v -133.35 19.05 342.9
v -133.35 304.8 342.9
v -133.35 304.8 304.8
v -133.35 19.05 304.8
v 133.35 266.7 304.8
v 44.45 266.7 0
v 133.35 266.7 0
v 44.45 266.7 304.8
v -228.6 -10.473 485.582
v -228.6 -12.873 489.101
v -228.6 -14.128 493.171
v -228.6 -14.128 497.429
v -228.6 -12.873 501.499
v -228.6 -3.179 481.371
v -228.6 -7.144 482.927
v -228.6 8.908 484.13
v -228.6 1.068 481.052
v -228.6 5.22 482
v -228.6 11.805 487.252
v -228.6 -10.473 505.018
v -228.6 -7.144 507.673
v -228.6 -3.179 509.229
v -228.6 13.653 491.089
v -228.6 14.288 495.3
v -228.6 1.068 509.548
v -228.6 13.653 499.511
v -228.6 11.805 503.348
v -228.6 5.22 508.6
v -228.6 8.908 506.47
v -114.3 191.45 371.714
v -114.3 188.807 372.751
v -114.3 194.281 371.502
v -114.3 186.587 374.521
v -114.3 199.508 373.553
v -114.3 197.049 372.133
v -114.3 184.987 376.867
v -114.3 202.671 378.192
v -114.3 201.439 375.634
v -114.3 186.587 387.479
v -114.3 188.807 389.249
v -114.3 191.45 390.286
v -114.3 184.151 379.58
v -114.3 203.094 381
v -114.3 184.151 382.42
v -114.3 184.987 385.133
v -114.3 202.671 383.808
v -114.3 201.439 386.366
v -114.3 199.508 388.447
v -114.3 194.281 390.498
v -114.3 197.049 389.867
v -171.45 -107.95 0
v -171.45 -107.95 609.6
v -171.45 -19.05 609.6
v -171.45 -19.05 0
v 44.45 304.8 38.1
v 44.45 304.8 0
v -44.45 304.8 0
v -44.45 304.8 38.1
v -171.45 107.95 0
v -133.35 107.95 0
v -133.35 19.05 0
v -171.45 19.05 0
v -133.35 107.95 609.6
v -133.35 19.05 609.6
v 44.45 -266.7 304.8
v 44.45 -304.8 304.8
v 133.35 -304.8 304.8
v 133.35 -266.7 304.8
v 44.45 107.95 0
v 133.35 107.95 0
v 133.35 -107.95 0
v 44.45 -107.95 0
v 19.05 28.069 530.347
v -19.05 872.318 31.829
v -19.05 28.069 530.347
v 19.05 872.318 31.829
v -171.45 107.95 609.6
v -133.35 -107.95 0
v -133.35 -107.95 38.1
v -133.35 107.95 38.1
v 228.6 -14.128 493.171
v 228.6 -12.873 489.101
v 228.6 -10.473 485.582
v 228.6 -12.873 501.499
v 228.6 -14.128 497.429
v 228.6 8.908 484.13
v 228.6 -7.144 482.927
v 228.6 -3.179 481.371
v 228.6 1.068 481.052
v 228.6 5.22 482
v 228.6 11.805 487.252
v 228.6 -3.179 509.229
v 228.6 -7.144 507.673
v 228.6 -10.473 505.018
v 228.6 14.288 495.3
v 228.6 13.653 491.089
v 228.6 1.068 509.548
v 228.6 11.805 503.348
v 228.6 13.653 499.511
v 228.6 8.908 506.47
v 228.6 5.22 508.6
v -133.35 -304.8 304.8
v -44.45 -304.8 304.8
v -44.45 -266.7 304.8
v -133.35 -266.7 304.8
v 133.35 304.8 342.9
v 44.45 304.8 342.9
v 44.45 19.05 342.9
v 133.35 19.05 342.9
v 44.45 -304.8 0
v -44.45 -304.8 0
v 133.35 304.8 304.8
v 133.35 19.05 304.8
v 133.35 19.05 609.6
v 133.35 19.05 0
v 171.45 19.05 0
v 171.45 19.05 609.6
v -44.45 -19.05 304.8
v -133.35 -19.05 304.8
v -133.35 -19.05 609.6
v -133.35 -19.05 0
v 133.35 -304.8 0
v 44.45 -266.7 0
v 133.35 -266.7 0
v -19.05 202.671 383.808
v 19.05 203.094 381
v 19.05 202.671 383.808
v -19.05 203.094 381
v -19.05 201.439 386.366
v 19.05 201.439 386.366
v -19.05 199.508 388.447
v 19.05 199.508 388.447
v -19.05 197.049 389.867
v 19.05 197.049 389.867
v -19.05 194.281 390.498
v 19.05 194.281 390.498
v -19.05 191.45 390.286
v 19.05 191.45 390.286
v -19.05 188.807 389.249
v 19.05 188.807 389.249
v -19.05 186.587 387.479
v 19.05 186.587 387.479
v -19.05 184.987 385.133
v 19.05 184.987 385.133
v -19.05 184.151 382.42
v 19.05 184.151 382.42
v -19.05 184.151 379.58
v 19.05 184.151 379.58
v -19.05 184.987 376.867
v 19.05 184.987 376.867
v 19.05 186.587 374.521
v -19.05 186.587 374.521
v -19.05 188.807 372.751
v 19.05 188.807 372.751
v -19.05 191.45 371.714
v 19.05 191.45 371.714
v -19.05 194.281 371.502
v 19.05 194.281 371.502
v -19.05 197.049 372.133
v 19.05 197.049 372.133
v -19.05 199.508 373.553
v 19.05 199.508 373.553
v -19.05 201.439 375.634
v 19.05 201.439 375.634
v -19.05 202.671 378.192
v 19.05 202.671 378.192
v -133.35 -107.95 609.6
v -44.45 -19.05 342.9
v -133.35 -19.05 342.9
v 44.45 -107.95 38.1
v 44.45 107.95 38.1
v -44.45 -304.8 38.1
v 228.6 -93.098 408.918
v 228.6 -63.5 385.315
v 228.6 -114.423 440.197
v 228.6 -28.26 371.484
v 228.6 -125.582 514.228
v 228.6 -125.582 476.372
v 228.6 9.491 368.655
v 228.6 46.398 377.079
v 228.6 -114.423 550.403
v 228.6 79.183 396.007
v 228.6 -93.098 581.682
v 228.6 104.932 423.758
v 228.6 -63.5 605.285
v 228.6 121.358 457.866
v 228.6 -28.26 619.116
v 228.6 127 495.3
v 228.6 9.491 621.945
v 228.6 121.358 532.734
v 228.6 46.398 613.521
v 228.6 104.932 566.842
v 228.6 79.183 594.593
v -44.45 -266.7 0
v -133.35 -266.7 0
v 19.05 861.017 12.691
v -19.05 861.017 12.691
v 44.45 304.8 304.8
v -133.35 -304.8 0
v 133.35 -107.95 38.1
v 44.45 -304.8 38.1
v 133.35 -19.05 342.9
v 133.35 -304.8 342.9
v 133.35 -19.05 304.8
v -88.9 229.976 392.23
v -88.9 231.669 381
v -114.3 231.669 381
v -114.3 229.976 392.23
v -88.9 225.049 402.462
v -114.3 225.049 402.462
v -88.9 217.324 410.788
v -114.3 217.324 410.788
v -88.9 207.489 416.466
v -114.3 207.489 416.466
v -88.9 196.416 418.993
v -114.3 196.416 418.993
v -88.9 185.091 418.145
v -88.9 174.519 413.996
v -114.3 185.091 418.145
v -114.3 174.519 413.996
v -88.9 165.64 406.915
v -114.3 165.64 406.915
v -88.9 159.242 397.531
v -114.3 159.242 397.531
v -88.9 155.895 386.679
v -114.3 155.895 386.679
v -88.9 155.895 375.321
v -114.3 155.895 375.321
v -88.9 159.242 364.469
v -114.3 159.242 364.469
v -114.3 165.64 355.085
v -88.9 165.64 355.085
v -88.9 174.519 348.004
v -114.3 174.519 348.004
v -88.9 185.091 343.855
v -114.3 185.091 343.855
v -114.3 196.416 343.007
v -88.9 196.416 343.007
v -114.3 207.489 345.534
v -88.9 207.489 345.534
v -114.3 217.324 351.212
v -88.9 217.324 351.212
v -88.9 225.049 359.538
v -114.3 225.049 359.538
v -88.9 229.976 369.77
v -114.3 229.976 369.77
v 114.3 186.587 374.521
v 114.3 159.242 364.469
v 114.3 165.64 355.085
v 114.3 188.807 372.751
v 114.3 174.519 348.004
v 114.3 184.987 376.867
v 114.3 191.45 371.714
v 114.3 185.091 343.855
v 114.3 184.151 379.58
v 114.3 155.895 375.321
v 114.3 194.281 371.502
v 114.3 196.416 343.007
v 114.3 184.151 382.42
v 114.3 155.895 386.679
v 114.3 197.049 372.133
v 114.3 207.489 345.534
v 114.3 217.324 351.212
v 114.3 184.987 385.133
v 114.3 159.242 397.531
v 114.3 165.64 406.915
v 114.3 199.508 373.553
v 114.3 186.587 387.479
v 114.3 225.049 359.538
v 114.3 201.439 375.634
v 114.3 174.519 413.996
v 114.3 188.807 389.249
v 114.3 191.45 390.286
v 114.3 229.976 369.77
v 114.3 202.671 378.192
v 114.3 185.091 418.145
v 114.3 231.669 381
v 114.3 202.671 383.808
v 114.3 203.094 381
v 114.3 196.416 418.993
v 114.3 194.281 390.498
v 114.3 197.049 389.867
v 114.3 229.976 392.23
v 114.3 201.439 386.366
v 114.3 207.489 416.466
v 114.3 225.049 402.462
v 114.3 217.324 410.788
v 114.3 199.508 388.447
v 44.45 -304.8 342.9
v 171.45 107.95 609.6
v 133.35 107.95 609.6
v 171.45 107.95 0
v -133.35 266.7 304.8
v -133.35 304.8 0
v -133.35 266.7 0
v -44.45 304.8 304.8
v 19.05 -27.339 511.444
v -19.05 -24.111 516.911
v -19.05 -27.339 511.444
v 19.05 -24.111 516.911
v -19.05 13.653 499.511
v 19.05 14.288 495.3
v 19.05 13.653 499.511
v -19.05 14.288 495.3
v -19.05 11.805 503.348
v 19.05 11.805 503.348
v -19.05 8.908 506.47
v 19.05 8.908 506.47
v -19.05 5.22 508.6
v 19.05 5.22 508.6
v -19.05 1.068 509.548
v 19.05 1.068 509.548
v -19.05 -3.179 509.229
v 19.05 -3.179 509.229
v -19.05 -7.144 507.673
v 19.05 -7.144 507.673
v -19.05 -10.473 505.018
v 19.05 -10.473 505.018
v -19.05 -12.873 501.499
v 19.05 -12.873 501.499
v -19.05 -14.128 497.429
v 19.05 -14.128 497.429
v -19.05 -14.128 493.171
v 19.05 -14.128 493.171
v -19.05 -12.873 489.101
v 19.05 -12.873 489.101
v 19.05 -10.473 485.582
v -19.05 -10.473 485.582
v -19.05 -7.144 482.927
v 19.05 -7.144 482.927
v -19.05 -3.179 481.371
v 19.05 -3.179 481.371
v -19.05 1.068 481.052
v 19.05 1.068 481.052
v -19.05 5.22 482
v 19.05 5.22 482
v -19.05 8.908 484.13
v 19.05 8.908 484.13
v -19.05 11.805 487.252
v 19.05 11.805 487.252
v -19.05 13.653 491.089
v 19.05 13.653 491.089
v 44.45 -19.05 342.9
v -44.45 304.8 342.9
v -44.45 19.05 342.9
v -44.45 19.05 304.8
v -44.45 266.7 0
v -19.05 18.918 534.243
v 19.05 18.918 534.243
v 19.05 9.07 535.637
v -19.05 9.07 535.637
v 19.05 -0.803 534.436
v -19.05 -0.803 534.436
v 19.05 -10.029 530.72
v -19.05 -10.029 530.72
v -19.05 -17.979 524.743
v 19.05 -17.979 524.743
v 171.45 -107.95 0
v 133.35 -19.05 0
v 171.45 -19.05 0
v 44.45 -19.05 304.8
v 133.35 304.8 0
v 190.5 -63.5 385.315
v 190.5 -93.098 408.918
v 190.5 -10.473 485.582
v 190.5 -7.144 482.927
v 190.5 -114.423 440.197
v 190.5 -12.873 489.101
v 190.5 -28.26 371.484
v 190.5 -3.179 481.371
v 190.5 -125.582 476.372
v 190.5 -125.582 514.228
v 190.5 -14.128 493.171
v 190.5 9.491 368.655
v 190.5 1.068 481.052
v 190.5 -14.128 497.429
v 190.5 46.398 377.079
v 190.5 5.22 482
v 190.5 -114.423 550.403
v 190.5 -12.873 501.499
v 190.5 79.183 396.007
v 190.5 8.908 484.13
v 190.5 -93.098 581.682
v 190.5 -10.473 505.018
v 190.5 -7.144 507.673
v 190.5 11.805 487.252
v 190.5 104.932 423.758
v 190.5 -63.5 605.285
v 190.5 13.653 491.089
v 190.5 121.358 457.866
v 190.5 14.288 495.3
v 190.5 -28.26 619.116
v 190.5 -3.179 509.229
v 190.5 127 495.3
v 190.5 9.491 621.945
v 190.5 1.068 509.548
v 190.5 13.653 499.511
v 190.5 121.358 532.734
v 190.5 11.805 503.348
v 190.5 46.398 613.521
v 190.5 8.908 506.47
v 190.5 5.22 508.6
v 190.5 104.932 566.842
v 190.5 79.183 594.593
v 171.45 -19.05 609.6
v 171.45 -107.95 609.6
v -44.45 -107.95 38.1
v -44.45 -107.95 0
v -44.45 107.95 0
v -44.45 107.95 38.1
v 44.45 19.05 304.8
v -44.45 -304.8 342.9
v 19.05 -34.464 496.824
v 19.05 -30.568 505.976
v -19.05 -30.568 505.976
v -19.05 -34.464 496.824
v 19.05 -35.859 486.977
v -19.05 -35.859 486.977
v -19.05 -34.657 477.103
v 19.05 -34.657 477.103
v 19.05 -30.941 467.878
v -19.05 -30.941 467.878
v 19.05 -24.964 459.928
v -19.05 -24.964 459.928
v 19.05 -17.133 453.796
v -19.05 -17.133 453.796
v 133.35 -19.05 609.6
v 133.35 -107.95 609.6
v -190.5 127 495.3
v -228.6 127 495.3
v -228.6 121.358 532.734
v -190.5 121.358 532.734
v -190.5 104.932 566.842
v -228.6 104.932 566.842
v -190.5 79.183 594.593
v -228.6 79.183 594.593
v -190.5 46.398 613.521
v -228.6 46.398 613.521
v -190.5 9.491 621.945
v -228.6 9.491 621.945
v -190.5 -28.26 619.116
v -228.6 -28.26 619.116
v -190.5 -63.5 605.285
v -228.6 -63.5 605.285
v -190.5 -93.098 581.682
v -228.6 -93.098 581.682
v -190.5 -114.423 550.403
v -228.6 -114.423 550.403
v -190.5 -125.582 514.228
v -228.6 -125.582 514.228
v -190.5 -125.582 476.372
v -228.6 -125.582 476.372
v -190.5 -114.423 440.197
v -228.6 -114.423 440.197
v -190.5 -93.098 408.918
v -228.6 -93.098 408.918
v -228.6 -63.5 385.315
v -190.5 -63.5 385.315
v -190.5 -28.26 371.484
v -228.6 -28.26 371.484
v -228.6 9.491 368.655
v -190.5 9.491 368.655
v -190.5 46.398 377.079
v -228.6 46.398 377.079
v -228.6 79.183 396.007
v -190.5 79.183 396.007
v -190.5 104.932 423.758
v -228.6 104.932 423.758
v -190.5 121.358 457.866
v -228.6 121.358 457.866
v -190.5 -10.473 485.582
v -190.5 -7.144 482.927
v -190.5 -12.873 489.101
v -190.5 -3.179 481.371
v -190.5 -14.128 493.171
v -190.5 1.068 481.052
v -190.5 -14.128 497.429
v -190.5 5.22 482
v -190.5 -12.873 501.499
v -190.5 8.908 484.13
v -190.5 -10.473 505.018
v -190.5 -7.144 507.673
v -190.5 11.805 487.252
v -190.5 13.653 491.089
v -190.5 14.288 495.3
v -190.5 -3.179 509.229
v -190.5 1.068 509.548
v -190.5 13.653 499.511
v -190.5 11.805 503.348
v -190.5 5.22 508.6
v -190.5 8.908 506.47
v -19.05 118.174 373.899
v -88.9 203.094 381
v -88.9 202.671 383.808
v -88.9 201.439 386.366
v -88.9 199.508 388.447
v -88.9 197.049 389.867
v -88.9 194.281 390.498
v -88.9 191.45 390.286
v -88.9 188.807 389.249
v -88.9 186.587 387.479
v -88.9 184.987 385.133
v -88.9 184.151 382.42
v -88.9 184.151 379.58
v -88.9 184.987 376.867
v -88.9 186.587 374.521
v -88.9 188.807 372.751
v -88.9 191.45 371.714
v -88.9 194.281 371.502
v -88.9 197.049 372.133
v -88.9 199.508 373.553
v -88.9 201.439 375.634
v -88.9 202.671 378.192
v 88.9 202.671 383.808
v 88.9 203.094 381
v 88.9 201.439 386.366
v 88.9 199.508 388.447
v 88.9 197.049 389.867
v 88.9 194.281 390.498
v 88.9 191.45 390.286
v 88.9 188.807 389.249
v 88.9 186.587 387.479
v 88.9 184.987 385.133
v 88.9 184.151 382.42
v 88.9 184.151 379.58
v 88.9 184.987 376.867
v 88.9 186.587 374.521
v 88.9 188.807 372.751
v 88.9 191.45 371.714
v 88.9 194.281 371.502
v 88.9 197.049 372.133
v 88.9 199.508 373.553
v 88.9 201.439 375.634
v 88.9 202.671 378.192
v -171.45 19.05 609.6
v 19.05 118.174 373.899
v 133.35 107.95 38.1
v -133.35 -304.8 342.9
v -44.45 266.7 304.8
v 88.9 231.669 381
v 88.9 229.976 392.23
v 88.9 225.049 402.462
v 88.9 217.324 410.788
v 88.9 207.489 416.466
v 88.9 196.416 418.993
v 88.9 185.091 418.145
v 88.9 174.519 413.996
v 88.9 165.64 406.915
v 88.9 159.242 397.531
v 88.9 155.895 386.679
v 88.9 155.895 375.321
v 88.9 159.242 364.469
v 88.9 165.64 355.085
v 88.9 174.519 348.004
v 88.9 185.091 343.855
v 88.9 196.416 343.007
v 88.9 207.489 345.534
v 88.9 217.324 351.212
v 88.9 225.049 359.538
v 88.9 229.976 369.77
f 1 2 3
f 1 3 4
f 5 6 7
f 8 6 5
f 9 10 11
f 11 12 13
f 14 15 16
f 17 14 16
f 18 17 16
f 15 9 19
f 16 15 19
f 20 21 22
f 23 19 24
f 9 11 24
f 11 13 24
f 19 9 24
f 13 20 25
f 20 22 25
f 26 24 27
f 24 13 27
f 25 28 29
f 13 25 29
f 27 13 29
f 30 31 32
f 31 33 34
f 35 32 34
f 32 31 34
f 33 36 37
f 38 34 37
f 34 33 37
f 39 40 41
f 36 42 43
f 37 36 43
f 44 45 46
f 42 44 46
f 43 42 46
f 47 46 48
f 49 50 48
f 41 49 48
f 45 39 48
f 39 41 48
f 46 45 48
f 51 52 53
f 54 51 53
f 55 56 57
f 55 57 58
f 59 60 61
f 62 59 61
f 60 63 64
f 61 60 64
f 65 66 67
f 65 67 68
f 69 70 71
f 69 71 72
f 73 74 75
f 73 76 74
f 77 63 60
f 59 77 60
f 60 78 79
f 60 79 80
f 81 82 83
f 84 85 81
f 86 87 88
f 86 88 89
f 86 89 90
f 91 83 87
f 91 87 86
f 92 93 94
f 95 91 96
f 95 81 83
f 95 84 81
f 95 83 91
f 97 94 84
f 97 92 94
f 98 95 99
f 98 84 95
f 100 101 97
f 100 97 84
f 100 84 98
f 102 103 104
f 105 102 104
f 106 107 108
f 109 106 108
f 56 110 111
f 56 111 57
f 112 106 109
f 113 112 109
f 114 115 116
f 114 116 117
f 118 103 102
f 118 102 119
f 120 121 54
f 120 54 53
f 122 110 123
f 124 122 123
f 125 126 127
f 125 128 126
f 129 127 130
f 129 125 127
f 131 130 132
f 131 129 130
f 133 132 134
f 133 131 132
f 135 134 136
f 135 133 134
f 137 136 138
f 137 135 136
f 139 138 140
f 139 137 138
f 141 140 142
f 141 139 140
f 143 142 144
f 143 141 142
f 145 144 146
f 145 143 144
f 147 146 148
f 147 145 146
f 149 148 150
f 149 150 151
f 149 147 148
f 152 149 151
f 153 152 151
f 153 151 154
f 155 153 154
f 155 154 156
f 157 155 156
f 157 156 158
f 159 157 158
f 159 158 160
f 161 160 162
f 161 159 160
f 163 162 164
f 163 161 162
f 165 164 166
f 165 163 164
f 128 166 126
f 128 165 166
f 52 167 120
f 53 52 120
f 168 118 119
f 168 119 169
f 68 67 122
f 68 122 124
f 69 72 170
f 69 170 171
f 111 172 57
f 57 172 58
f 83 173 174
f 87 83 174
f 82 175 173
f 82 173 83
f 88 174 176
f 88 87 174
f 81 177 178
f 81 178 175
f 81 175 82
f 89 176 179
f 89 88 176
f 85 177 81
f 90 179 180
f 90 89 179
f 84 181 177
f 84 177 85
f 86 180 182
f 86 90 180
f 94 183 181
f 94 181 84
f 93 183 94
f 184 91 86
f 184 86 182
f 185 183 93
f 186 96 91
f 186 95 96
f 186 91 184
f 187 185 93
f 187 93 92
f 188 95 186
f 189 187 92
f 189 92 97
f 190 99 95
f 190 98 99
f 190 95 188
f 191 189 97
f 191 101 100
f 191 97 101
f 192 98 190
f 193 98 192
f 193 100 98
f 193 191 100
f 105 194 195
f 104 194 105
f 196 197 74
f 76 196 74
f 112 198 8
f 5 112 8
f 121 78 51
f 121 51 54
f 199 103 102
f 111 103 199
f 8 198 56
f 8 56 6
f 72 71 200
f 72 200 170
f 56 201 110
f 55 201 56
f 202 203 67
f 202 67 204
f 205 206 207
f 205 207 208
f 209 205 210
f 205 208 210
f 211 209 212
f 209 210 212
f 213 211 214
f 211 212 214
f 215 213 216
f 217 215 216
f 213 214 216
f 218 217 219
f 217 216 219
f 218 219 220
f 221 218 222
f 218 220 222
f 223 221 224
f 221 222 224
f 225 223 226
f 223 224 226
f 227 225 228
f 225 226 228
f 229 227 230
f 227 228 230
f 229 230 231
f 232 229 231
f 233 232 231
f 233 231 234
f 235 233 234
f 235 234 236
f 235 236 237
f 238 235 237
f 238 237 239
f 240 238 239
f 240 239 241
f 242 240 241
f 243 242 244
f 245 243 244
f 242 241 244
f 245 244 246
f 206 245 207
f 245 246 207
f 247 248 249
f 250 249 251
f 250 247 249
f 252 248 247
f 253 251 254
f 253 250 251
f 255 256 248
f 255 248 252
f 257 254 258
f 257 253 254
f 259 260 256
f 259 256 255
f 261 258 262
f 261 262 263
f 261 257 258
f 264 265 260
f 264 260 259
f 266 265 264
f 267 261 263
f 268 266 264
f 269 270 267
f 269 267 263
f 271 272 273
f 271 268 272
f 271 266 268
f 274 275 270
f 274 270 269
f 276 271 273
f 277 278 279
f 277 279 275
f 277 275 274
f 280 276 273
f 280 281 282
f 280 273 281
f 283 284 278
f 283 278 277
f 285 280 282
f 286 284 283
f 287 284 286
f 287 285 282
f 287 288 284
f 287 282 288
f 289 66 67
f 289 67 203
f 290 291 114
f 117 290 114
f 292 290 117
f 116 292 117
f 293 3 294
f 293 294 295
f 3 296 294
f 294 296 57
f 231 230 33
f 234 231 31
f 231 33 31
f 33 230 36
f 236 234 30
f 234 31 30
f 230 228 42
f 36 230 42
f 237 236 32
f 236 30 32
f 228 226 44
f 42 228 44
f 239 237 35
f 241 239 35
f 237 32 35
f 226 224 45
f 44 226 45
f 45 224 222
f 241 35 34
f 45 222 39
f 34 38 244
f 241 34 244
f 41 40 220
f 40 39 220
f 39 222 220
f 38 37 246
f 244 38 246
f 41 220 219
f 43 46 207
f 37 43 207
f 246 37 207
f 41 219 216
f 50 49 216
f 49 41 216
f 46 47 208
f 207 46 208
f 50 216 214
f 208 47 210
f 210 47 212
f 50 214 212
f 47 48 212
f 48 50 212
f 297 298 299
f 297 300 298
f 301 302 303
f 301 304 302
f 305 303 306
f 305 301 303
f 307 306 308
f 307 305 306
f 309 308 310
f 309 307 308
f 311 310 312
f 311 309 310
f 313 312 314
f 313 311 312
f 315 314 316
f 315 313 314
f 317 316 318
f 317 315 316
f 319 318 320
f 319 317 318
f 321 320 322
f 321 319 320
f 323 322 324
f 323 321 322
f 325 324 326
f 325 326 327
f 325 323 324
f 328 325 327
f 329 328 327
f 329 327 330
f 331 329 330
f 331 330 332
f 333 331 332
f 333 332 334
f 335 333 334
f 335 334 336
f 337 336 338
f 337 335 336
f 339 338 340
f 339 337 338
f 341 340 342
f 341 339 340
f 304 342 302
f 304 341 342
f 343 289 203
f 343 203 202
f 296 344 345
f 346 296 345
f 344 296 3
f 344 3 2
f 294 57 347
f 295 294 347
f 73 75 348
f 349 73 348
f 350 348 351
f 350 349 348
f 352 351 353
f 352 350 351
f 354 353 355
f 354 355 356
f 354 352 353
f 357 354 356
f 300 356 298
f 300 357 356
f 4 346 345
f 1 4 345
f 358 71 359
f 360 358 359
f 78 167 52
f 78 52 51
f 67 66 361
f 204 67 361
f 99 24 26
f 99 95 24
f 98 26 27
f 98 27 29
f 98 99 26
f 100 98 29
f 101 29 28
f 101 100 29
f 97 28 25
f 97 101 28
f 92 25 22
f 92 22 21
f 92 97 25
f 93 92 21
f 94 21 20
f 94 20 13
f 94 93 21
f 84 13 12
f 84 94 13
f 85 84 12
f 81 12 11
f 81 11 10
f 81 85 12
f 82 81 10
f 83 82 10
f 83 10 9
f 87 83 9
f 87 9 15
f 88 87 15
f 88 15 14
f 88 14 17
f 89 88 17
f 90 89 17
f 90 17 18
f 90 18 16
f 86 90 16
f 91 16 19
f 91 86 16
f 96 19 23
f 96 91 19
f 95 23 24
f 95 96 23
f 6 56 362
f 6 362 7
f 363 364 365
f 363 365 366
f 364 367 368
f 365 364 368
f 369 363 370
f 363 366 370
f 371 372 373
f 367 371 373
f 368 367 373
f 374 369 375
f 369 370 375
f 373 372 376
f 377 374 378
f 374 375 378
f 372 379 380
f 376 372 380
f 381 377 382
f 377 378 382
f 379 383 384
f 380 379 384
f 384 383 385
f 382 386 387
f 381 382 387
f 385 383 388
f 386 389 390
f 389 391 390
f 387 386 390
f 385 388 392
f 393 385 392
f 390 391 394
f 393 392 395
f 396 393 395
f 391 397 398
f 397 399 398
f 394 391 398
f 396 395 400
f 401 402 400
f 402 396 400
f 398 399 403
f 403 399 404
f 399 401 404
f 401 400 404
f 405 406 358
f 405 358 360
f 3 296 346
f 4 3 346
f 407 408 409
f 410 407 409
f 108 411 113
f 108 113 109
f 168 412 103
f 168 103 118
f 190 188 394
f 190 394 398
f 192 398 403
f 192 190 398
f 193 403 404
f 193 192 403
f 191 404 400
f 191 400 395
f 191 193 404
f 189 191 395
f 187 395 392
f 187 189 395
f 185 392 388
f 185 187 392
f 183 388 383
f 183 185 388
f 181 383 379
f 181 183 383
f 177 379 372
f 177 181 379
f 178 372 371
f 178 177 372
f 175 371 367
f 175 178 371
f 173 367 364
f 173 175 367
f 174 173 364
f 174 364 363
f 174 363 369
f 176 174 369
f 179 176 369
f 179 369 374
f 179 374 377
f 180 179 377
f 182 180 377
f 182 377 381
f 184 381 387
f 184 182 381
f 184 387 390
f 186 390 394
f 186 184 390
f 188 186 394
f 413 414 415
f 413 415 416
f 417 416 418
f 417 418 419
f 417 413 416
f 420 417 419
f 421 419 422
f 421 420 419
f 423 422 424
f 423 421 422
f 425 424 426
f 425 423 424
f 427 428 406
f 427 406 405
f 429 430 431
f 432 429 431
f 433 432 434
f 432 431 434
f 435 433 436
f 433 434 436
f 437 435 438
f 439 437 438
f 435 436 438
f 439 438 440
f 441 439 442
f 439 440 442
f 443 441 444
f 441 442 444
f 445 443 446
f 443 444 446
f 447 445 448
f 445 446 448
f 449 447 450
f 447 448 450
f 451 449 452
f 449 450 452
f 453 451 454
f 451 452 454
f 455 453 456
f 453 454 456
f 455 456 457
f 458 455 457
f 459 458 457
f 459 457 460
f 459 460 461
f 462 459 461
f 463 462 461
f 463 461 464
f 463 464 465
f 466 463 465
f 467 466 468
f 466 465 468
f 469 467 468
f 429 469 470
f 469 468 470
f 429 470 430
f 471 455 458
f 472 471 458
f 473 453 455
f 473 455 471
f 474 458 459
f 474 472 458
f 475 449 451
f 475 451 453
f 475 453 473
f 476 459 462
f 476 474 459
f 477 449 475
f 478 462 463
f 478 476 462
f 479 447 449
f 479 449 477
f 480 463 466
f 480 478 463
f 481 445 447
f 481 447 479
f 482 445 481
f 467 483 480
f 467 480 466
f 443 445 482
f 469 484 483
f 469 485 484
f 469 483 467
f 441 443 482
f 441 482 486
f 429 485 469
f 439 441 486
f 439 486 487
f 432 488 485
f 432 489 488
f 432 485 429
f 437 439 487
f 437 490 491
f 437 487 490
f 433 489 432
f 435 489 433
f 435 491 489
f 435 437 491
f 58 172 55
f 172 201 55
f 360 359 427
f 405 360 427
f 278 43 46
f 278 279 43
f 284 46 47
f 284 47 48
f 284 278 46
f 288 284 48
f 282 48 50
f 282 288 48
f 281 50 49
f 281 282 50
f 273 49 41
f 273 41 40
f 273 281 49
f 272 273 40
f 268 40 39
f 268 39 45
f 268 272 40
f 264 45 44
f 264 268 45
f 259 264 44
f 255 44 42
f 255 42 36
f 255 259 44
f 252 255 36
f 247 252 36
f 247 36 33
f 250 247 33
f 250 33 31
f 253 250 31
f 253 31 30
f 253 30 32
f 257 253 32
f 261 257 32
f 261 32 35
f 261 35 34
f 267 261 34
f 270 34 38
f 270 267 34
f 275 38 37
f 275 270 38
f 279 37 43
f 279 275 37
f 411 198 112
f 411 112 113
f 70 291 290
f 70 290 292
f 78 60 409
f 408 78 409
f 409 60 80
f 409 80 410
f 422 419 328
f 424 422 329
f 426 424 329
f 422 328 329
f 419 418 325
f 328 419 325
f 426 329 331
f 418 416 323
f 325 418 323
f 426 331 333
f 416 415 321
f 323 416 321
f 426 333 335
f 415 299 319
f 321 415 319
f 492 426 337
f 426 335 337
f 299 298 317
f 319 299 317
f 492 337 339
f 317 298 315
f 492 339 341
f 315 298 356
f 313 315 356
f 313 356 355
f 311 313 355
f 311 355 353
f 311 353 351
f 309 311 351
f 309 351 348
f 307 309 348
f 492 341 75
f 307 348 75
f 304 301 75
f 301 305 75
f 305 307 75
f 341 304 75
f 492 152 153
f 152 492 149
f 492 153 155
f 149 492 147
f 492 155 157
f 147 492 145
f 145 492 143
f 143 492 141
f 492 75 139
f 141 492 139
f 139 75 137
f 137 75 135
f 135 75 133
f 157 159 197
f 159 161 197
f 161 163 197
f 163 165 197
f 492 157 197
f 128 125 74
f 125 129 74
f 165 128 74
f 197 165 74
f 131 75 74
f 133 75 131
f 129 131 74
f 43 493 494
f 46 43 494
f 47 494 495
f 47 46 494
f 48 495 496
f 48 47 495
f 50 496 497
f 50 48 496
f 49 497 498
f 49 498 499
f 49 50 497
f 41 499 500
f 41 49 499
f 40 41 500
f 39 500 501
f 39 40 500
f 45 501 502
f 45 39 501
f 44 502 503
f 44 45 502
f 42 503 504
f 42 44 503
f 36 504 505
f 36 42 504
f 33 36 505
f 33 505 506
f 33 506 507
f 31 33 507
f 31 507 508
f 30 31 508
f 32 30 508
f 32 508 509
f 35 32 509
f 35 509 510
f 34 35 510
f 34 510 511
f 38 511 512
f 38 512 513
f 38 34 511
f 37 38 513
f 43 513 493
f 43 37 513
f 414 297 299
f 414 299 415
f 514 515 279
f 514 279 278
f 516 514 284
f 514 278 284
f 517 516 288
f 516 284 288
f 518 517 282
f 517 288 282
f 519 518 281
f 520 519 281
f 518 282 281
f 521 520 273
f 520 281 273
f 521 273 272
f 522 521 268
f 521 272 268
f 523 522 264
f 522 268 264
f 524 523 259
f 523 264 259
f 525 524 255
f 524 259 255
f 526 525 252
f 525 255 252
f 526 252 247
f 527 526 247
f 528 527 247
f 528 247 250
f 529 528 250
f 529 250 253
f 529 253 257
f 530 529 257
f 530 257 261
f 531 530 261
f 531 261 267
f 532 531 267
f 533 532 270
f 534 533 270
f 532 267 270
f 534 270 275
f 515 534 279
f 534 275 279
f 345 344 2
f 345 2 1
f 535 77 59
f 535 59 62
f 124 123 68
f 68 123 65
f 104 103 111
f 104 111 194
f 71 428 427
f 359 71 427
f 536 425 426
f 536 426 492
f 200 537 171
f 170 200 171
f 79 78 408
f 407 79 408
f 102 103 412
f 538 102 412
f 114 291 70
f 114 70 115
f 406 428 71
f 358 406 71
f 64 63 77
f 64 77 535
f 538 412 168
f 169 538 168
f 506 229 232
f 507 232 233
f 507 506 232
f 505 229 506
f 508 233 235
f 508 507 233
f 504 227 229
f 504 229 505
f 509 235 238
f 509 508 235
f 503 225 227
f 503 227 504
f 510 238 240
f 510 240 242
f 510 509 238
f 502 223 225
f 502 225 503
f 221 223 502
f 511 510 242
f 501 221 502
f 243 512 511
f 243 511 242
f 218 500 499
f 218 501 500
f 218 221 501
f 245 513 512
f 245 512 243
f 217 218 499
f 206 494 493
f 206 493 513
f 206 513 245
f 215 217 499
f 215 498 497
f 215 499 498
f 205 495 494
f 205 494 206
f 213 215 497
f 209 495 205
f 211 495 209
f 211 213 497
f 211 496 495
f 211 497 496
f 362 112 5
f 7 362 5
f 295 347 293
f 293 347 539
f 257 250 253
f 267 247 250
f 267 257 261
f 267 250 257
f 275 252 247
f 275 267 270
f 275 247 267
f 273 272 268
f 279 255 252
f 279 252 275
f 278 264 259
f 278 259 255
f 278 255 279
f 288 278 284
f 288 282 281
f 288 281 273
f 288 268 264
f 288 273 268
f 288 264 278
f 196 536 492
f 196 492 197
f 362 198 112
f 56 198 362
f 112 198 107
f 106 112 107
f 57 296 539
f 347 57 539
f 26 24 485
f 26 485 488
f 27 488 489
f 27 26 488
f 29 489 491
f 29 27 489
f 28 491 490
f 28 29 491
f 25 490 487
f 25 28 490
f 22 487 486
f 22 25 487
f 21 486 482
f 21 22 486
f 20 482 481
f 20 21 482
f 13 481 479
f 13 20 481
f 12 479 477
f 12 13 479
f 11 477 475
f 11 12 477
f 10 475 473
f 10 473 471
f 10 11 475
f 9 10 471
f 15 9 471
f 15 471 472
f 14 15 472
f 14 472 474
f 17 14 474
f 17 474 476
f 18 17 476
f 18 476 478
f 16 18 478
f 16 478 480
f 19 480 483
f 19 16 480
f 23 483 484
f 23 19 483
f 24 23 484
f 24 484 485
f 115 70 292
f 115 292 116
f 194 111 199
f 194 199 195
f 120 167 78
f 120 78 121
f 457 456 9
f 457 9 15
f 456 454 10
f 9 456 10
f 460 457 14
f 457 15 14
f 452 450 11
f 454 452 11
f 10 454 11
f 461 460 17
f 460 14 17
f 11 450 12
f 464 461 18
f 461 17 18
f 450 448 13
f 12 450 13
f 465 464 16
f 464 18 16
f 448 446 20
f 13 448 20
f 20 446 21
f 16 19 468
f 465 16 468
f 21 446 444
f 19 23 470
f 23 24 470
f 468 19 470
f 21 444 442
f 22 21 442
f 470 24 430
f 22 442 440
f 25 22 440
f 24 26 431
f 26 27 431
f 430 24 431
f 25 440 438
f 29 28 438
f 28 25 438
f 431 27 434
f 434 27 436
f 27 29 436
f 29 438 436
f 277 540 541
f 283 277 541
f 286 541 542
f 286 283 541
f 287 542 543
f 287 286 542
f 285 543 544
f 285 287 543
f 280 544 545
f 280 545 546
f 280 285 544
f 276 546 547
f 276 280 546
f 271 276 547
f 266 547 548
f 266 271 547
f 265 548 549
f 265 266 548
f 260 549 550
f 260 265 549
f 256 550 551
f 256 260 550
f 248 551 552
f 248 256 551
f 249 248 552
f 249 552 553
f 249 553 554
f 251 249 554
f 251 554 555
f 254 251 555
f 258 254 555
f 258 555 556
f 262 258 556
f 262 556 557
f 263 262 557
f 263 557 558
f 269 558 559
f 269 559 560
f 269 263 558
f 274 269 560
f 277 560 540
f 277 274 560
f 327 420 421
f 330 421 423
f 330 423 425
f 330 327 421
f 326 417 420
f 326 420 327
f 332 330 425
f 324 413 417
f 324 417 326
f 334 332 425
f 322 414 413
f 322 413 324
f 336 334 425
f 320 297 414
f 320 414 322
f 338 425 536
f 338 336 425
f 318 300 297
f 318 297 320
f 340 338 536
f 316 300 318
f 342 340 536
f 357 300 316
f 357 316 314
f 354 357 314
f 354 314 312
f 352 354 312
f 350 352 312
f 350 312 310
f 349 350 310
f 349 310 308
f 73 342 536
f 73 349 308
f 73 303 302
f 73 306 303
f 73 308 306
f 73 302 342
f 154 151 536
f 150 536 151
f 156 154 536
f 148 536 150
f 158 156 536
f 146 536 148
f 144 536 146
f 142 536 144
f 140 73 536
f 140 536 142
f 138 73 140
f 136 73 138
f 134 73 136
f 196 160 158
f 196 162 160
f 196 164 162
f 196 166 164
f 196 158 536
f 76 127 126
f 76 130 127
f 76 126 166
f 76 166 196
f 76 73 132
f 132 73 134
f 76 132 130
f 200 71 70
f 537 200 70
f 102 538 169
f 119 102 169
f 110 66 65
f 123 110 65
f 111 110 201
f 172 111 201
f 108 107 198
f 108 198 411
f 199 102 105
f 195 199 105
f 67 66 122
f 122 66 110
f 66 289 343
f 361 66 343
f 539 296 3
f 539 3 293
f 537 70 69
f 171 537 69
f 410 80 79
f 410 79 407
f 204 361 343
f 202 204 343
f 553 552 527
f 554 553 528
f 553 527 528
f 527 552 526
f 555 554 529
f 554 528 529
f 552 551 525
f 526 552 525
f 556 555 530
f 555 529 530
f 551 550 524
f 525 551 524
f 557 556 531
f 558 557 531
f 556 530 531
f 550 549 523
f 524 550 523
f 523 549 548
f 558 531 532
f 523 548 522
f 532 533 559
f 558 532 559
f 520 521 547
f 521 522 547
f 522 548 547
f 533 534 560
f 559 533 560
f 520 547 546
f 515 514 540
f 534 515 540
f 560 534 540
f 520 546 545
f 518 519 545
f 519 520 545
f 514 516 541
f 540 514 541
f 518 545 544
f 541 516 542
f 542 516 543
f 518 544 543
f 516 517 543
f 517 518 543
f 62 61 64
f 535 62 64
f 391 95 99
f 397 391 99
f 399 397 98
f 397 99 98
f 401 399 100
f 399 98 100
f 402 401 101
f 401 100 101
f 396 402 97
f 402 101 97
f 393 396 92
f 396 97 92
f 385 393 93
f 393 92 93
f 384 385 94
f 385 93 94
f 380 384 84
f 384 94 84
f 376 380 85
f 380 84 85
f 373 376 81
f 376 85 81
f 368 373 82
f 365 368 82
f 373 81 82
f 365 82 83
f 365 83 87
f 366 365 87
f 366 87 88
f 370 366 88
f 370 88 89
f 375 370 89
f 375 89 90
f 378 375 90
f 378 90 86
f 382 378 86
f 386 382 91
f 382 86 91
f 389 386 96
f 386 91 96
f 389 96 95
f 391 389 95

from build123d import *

# Parameters (mm, degrees)
F0_W      = 609.6
F0_H      = 38.1
F1_DEPTH  = 44.45
F2_W      = 38.1
F2_H      = 266.7
F2_H_2    = 38.1
F3_DEPTH  = 88.9
F5_W      = 285.75
F5_H      = 38.1
F6_DEPTH  = 88.9
F9_W      = 88.9
F9_H      = 266.7
F9_H_2    = 38.1
F9_H_3    = 304.8
F10_DEPTH = 38.1
F13_W     = 88.9
F13_H     = 215.9
F14_DEPTH = 38.1
F16_R     = 14.2875
F17_DEPTH = 228.6
F18_R     = 127
F18_R_2   = 14.2875
F19_DEPTH = 38.1
F21_R     = 9.525
F22_DEPTH = 114.3
F23_R     = 38.1
F23_R_2   = 9.525
F24_DEPTH = 25.4
F26_R     = 9.525
F26_R_2   = 14.2875
F27_DEPTH = 19.05


with BuildPart() as f1:
    # F0 (on Right) → F1 (new body, symmetric)
    with BuildSketch(Plane.YZ):
        with Locations((0, 19.05)):
            Rectangle(F0_W, F0_H)
    extrude(amount=F1_DEPTH, both=True)


with BuildPart() as f3:
    # F2 (on face) → F3 (new body)
    with BuildSketch(Plane.YZ.offset(44.45)):
        with Locations((-285.75, 171.45)):
            Rectangle(F2_W, F2_H)
        with Locations((-285.75, 19.05)):
            Rectangle(F2_W, F2_H_2)
    extrude(amount=F3_DEPTH)


with BuildPart() as f4_1:
    # F4: instance of F3
    add(f3.part.mirror(Plane.YZ))


with BuildPart() as f6:
    # F5 (on face) → F6 (new body)
    with BuildSketch(Plane.YZ.offset(44.45)):
        with Locations((-161.925, 323.85)):
            Rectangle(F5_W, F5_H)
    extrude(amount=F6_DEPTH)


with BuildPart() as f7_1:
    # F7: instance of F6
    add(f6.part.mirror(Plane.YZ))


with BuildPart() as f8_1:
    # F8: instance of F3
    add(f3.part.mirror(Plane.XZ))


with BuildPart() as f8_2:
    # F8: instance of F6
    add(f6.part.mirror(Plane.XZ))


with BuildPart() as f8_3:
    # F8: instance of F7_1
    add(f7_1.part.mirror(Plane.XZ))


with BuildPart() as f8_4:
    # F8: instance of F4_1
    add(f4_1.part.mirror(Plane.XZ))


with BuildPart() as f10:
    # F9 (on face) → F10 (new body)
    with BuildSketch(Plane.YZ.offset(133.35)):
        with Locations((-63.5, 476.25)):
            Rectangle(F9_W, F9_H)
        with Locations((-63.5, 323.85)):
            Rectangle(F9_W, F9_H_2)
        with Locations((-63.5, 152.4)):
            Rectangle(F9_W, F9_H_3)
    extrude(amount=F10_DEPTH)


with BuildPart() as f11_1:
    # F11: instance of F10
    add(f10.part.mirror(Plane.YZ))


with BuildPart() as f12_1:
    # F12: instance of F10
    add(f10.part.mirror(Plane.XZ))


with BuildPart() as f12_2:
    # F12: instance of F11_1
    add(f11_1.part.mirror(Plane.XZ))


with BuildPart() as f14:
    # F13 (on Top) → F14 (new body)
    with BuildSketch(Plane.XY):
        with Locations((-88.9, 0)):
            Rectangle(F13_W, F13_H)
    extrude(amount=F14_DEPTH)


with BuildPart() as f15_1:
    # F15: instance of F14
    add(f14.part.mirror(Plane.YZ))


with BuildPart() as f17:
    # F16 (on Right) → F17 (new body, symmetric)
    with BuildSketch(Plane.YZ):
        with Locations((0, 495.3)):
            Circle(F16_R)
    extrude(amount=F17_DEPTH, both=True)


with BuildPart() as f19:
    # F18 (on face) → F19 (new body)
    with BuildSketch(Plane.YZ.offset(228.6)):
        with Locations((0, 495.3)):
            Circle(F18_R)
        with Locations((0, 495.3)):
            Circle(F18_R_2, mode=Mode.SUBTRACT)
    extrude(amount=-F19_DEPTH)


with BuildPart() as f20_1:
    # F20: instance of F19
    add(f19.part.mirror(Plane.YZ))


with BuildPart() as f22:
    # F21 (on Right) → F22 (new body, symmetric)
    with BuildSketch(Plane.YZ):
        with Locations((193.5691386461, 381)):
            Circle(F21_R)
    extrude(amount=F22_DEPTH, both=True)


with BuildPart() as f24:
    # F23 (on face) → F24 (new body)
    with BuildSketch(Plane.YZ.offset(114.3)):
        with Locations((193.5691386461, 381)):
            Circle(F23_R)
        with Locations((193.5691386461, 381)):
            Circle(F23_R_2, mode=Mode.SUBTRACT)
    extrude(amount=-F24_DEPTH)


with BuildPart() as f25_1:
    # F25: instance of F24
    add(f24.part.mirror(Plane.YZ))


with BuildPart() as f27:
    # F26 (on Right) → F27 (new body, symmetric)
    with BuildSketch(Plane.YZ):
        with BuildLine():
            Line((-24.1107547215, 516.9114901559), (-27.3394738007, 511.4435953958))
            Line((-27.3394738007, 511.4435953958), (-30.5681928798, 505.9757006357))
            ThreePointArc((-30.5681928798, 505.9757006357), (-34.6574320338, 477.103368311), (-17.133138794, 453.7960175999))
            Line((-17.133138794, 453.7960175999), (118.1735009264, 373.8992477521))
            Line((118.1735009264, 373.8992477521), (861.017026639, 12.6913421614))
            Line((861.017026639, 12.6913421614), (872.3175434161, 31.8289738219))
            Line((872.3175434161, 31.8289738219), (28.0689283142, 530.3465442418))
            ThreePointArc((28.0689283142, 530.3465442418), (-0.8034040104, 534.4357833957), (-24.1107547215, 516.9114901559))
        make_face()
        with Locations((193.5691386461, 381)):
            Circle(F26_R, mode=Mode.SUBTRACT)
        with Locations((0, 495.3)):
            Circle(F26_R_2, mode=Mode.SUBTRACT)
    extrude(amount=F27_DEPTH, both=True)


solid = Compound([f1.part, f3.part, f4_1.part, f6.part, f7_1.part, f8_1.part, f8_2.part, f8_3.part, f8_4.part, f10.part, f11_1.part, f12_1.part, f12_2.part, f14.part, f15_1.part, f17.part, f19.part, f20_1.part, f22.part, f24.part, f25_1.part, f27.part])
